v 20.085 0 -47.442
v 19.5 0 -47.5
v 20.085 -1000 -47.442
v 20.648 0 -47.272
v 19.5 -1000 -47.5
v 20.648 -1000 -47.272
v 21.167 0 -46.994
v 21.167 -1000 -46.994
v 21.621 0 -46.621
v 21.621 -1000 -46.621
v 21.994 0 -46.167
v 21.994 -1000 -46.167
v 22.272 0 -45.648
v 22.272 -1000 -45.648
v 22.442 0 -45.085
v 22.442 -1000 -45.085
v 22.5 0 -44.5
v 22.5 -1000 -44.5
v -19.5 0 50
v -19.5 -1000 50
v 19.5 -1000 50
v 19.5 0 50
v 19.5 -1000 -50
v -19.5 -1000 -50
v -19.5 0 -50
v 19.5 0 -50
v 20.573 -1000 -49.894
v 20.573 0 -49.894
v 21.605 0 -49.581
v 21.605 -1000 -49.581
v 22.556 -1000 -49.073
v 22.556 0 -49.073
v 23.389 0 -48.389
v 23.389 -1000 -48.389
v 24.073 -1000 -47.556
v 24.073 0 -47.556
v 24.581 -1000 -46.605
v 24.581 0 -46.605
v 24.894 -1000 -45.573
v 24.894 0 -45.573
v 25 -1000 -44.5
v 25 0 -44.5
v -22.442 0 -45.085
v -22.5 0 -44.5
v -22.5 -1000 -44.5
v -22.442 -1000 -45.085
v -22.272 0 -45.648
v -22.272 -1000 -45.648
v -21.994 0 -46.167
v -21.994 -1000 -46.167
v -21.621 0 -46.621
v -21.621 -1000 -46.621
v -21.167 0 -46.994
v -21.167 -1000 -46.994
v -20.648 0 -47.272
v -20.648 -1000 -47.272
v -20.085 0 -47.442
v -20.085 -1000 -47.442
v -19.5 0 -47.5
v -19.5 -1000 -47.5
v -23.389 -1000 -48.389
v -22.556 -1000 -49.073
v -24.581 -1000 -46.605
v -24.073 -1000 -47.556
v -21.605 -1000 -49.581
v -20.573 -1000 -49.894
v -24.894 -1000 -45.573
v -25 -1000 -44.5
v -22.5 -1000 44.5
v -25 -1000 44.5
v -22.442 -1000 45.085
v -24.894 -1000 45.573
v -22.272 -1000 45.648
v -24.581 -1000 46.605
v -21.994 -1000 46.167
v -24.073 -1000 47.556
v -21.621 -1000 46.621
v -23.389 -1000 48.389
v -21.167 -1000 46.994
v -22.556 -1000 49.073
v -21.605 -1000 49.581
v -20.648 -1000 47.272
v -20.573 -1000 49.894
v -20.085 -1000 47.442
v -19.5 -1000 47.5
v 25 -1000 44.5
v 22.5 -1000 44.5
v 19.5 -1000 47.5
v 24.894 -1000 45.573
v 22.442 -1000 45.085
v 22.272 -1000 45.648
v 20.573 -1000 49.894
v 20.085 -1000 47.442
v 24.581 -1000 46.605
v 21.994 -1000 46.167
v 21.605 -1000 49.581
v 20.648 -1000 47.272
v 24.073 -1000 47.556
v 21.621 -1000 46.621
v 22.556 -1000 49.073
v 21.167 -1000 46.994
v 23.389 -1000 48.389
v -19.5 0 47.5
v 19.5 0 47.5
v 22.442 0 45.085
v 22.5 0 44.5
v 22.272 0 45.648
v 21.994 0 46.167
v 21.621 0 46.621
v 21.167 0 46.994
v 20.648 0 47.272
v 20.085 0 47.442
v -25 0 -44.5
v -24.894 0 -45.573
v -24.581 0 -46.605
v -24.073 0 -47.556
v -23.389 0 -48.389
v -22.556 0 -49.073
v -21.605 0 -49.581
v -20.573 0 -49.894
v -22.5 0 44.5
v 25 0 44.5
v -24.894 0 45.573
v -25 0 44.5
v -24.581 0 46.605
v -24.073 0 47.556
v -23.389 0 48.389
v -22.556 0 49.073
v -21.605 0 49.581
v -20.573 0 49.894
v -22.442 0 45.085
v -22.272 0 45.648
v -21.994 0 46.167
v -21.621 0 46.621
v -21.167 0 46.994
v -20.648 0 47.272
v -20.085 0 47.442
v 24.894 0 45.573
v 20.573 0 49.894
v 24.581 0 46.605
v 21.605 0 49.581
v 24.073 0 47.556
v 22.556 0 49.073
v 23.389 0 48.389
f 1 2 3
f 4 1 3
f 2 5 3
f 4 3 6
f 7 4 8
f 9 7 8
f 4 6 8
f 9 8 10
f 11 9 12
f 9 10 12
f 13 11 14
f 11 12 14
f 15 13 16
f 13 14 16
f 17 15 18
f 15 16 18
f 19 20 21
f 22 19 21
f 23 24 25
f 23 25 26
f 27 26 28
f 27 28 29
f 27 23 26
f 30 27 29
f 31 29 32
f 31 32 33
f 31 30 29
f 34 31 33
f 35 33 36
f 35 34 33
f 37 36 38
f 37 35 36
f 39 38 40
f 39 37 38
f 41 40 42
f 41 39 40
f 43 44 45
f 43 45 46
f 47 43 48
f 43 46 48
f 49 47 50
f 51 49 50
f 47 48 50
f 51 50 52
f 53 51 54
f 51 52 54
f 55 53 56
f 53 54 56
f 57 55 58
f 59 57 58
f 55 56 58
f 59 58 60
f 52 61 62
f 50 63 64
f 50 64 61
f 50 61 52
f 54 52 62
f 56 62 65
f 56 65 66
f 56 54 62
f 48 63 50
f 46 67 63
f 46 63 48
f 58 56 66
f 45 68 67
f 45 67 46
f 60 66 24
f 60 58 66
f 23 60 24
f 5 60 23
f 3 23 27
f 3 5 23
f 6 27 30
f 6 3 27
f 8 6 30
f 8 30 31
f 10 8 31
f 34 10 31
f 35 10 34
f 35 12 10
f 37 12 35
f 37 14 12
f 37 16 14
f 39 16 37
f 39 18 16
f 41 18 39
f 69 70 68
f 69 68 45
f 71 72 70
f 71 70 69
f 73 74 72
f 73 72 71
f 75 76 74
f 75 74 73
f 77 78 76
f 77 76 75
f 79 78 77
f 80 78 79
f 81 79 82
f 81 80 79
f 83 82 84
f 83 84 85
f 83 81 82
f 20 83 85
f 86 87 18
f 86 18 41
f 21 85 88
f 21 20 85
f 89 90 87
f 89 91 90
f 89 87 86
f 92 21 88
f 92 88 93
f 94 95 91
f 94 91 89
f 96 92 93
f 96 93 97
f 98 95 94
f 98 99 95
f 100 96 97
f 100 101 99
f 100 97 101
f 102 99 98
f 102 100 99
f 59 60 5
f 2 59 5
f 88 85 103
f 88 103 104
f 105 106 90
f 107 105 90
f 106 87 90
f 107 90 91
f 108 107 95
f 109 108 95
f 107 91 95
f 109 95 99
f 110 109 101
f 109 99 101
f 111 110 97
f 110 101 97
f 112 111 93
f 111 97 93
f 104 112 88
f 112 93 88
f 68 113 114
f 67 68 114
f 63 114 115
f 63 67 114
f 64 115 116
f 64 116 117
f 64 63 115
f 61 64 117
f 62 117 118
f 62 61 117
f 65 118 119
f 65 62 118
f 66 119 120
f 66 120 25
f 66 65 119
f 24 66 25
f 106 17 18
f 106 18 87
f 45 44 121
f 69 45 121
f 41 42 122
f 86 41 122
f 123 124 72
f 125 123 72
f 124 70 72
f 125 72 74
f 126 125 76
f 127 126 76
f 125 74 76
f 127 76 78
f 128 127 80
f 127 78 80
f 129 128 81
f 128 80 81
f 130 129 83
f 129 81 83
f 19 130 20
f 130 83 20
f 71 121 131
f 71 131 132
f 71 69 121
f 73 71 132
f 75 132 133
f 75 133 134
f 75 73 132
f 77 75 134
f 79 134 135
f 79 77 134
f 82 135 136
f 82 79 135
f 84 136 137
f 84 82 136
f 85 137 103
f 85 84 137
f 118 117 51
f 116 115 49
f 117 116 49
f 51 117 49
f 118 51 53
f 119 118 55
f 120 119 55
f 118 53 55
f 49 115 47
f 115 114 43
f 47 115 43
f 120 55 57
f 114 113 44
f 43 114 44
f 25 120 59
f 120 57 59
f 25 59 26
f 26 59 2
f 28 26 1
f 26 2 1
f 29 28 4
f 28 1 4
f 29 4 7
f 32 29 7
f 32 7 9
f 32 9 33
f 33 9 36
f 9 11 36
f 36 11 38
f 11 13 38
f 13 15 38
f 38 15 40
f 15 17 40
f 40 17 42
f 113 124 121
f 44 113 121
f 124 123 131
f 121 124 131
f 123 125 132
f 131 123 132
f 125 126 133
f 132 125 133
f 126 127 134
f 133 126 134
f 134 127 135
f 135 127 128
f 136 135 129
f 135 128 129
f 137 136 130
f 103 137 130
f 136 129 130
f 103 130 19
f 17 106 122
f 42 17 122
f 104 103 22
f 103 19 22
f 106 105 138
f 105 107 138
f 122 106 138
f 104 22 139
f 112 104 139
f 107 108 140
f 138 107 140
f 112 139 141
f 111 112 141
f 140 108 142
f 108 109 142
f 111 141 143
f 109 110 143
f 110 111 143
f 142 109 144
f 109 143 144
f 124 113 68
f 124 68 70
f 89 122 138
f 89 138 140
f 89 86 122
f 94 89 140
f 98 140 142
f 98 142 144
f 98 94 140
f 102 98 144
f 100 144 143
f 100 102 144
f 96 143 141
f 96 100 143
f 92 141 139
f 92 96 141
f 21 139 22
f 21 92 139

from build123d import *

# Parameters (mm, degrees)
F0_W     = 50
F0_H     = 100
F1_DEPTH = 1000
F2_R     = 5.5
F3_T     = -2.5


with BuildPart() as f1:
    # F0 (on Front) → F1 (new body)
    with BuildSketch(Plane.XZ):
        Rectangle(F0_W, F0_H)
    extrude(amount=F1_DEPTH)

    # F2
    f2_edges = [f1.edges().sort_by_distance(p)[0] for p in [
        (-25, -500, 50),
        (25, -500, 50),
        (25, -500, -50),
        (-25, -500, -50),
    ]]
    fillet(f2_edges, radius=F2_R)

    # F3
    f3_openings = [f1.faces().sort_by_distance(p)[0] for p in [
        (0, -1000, 0),
        (0, 0, 0),
    ]]
    offset(amount=F3_T, openings=f3_openings)


solid = f1.part
